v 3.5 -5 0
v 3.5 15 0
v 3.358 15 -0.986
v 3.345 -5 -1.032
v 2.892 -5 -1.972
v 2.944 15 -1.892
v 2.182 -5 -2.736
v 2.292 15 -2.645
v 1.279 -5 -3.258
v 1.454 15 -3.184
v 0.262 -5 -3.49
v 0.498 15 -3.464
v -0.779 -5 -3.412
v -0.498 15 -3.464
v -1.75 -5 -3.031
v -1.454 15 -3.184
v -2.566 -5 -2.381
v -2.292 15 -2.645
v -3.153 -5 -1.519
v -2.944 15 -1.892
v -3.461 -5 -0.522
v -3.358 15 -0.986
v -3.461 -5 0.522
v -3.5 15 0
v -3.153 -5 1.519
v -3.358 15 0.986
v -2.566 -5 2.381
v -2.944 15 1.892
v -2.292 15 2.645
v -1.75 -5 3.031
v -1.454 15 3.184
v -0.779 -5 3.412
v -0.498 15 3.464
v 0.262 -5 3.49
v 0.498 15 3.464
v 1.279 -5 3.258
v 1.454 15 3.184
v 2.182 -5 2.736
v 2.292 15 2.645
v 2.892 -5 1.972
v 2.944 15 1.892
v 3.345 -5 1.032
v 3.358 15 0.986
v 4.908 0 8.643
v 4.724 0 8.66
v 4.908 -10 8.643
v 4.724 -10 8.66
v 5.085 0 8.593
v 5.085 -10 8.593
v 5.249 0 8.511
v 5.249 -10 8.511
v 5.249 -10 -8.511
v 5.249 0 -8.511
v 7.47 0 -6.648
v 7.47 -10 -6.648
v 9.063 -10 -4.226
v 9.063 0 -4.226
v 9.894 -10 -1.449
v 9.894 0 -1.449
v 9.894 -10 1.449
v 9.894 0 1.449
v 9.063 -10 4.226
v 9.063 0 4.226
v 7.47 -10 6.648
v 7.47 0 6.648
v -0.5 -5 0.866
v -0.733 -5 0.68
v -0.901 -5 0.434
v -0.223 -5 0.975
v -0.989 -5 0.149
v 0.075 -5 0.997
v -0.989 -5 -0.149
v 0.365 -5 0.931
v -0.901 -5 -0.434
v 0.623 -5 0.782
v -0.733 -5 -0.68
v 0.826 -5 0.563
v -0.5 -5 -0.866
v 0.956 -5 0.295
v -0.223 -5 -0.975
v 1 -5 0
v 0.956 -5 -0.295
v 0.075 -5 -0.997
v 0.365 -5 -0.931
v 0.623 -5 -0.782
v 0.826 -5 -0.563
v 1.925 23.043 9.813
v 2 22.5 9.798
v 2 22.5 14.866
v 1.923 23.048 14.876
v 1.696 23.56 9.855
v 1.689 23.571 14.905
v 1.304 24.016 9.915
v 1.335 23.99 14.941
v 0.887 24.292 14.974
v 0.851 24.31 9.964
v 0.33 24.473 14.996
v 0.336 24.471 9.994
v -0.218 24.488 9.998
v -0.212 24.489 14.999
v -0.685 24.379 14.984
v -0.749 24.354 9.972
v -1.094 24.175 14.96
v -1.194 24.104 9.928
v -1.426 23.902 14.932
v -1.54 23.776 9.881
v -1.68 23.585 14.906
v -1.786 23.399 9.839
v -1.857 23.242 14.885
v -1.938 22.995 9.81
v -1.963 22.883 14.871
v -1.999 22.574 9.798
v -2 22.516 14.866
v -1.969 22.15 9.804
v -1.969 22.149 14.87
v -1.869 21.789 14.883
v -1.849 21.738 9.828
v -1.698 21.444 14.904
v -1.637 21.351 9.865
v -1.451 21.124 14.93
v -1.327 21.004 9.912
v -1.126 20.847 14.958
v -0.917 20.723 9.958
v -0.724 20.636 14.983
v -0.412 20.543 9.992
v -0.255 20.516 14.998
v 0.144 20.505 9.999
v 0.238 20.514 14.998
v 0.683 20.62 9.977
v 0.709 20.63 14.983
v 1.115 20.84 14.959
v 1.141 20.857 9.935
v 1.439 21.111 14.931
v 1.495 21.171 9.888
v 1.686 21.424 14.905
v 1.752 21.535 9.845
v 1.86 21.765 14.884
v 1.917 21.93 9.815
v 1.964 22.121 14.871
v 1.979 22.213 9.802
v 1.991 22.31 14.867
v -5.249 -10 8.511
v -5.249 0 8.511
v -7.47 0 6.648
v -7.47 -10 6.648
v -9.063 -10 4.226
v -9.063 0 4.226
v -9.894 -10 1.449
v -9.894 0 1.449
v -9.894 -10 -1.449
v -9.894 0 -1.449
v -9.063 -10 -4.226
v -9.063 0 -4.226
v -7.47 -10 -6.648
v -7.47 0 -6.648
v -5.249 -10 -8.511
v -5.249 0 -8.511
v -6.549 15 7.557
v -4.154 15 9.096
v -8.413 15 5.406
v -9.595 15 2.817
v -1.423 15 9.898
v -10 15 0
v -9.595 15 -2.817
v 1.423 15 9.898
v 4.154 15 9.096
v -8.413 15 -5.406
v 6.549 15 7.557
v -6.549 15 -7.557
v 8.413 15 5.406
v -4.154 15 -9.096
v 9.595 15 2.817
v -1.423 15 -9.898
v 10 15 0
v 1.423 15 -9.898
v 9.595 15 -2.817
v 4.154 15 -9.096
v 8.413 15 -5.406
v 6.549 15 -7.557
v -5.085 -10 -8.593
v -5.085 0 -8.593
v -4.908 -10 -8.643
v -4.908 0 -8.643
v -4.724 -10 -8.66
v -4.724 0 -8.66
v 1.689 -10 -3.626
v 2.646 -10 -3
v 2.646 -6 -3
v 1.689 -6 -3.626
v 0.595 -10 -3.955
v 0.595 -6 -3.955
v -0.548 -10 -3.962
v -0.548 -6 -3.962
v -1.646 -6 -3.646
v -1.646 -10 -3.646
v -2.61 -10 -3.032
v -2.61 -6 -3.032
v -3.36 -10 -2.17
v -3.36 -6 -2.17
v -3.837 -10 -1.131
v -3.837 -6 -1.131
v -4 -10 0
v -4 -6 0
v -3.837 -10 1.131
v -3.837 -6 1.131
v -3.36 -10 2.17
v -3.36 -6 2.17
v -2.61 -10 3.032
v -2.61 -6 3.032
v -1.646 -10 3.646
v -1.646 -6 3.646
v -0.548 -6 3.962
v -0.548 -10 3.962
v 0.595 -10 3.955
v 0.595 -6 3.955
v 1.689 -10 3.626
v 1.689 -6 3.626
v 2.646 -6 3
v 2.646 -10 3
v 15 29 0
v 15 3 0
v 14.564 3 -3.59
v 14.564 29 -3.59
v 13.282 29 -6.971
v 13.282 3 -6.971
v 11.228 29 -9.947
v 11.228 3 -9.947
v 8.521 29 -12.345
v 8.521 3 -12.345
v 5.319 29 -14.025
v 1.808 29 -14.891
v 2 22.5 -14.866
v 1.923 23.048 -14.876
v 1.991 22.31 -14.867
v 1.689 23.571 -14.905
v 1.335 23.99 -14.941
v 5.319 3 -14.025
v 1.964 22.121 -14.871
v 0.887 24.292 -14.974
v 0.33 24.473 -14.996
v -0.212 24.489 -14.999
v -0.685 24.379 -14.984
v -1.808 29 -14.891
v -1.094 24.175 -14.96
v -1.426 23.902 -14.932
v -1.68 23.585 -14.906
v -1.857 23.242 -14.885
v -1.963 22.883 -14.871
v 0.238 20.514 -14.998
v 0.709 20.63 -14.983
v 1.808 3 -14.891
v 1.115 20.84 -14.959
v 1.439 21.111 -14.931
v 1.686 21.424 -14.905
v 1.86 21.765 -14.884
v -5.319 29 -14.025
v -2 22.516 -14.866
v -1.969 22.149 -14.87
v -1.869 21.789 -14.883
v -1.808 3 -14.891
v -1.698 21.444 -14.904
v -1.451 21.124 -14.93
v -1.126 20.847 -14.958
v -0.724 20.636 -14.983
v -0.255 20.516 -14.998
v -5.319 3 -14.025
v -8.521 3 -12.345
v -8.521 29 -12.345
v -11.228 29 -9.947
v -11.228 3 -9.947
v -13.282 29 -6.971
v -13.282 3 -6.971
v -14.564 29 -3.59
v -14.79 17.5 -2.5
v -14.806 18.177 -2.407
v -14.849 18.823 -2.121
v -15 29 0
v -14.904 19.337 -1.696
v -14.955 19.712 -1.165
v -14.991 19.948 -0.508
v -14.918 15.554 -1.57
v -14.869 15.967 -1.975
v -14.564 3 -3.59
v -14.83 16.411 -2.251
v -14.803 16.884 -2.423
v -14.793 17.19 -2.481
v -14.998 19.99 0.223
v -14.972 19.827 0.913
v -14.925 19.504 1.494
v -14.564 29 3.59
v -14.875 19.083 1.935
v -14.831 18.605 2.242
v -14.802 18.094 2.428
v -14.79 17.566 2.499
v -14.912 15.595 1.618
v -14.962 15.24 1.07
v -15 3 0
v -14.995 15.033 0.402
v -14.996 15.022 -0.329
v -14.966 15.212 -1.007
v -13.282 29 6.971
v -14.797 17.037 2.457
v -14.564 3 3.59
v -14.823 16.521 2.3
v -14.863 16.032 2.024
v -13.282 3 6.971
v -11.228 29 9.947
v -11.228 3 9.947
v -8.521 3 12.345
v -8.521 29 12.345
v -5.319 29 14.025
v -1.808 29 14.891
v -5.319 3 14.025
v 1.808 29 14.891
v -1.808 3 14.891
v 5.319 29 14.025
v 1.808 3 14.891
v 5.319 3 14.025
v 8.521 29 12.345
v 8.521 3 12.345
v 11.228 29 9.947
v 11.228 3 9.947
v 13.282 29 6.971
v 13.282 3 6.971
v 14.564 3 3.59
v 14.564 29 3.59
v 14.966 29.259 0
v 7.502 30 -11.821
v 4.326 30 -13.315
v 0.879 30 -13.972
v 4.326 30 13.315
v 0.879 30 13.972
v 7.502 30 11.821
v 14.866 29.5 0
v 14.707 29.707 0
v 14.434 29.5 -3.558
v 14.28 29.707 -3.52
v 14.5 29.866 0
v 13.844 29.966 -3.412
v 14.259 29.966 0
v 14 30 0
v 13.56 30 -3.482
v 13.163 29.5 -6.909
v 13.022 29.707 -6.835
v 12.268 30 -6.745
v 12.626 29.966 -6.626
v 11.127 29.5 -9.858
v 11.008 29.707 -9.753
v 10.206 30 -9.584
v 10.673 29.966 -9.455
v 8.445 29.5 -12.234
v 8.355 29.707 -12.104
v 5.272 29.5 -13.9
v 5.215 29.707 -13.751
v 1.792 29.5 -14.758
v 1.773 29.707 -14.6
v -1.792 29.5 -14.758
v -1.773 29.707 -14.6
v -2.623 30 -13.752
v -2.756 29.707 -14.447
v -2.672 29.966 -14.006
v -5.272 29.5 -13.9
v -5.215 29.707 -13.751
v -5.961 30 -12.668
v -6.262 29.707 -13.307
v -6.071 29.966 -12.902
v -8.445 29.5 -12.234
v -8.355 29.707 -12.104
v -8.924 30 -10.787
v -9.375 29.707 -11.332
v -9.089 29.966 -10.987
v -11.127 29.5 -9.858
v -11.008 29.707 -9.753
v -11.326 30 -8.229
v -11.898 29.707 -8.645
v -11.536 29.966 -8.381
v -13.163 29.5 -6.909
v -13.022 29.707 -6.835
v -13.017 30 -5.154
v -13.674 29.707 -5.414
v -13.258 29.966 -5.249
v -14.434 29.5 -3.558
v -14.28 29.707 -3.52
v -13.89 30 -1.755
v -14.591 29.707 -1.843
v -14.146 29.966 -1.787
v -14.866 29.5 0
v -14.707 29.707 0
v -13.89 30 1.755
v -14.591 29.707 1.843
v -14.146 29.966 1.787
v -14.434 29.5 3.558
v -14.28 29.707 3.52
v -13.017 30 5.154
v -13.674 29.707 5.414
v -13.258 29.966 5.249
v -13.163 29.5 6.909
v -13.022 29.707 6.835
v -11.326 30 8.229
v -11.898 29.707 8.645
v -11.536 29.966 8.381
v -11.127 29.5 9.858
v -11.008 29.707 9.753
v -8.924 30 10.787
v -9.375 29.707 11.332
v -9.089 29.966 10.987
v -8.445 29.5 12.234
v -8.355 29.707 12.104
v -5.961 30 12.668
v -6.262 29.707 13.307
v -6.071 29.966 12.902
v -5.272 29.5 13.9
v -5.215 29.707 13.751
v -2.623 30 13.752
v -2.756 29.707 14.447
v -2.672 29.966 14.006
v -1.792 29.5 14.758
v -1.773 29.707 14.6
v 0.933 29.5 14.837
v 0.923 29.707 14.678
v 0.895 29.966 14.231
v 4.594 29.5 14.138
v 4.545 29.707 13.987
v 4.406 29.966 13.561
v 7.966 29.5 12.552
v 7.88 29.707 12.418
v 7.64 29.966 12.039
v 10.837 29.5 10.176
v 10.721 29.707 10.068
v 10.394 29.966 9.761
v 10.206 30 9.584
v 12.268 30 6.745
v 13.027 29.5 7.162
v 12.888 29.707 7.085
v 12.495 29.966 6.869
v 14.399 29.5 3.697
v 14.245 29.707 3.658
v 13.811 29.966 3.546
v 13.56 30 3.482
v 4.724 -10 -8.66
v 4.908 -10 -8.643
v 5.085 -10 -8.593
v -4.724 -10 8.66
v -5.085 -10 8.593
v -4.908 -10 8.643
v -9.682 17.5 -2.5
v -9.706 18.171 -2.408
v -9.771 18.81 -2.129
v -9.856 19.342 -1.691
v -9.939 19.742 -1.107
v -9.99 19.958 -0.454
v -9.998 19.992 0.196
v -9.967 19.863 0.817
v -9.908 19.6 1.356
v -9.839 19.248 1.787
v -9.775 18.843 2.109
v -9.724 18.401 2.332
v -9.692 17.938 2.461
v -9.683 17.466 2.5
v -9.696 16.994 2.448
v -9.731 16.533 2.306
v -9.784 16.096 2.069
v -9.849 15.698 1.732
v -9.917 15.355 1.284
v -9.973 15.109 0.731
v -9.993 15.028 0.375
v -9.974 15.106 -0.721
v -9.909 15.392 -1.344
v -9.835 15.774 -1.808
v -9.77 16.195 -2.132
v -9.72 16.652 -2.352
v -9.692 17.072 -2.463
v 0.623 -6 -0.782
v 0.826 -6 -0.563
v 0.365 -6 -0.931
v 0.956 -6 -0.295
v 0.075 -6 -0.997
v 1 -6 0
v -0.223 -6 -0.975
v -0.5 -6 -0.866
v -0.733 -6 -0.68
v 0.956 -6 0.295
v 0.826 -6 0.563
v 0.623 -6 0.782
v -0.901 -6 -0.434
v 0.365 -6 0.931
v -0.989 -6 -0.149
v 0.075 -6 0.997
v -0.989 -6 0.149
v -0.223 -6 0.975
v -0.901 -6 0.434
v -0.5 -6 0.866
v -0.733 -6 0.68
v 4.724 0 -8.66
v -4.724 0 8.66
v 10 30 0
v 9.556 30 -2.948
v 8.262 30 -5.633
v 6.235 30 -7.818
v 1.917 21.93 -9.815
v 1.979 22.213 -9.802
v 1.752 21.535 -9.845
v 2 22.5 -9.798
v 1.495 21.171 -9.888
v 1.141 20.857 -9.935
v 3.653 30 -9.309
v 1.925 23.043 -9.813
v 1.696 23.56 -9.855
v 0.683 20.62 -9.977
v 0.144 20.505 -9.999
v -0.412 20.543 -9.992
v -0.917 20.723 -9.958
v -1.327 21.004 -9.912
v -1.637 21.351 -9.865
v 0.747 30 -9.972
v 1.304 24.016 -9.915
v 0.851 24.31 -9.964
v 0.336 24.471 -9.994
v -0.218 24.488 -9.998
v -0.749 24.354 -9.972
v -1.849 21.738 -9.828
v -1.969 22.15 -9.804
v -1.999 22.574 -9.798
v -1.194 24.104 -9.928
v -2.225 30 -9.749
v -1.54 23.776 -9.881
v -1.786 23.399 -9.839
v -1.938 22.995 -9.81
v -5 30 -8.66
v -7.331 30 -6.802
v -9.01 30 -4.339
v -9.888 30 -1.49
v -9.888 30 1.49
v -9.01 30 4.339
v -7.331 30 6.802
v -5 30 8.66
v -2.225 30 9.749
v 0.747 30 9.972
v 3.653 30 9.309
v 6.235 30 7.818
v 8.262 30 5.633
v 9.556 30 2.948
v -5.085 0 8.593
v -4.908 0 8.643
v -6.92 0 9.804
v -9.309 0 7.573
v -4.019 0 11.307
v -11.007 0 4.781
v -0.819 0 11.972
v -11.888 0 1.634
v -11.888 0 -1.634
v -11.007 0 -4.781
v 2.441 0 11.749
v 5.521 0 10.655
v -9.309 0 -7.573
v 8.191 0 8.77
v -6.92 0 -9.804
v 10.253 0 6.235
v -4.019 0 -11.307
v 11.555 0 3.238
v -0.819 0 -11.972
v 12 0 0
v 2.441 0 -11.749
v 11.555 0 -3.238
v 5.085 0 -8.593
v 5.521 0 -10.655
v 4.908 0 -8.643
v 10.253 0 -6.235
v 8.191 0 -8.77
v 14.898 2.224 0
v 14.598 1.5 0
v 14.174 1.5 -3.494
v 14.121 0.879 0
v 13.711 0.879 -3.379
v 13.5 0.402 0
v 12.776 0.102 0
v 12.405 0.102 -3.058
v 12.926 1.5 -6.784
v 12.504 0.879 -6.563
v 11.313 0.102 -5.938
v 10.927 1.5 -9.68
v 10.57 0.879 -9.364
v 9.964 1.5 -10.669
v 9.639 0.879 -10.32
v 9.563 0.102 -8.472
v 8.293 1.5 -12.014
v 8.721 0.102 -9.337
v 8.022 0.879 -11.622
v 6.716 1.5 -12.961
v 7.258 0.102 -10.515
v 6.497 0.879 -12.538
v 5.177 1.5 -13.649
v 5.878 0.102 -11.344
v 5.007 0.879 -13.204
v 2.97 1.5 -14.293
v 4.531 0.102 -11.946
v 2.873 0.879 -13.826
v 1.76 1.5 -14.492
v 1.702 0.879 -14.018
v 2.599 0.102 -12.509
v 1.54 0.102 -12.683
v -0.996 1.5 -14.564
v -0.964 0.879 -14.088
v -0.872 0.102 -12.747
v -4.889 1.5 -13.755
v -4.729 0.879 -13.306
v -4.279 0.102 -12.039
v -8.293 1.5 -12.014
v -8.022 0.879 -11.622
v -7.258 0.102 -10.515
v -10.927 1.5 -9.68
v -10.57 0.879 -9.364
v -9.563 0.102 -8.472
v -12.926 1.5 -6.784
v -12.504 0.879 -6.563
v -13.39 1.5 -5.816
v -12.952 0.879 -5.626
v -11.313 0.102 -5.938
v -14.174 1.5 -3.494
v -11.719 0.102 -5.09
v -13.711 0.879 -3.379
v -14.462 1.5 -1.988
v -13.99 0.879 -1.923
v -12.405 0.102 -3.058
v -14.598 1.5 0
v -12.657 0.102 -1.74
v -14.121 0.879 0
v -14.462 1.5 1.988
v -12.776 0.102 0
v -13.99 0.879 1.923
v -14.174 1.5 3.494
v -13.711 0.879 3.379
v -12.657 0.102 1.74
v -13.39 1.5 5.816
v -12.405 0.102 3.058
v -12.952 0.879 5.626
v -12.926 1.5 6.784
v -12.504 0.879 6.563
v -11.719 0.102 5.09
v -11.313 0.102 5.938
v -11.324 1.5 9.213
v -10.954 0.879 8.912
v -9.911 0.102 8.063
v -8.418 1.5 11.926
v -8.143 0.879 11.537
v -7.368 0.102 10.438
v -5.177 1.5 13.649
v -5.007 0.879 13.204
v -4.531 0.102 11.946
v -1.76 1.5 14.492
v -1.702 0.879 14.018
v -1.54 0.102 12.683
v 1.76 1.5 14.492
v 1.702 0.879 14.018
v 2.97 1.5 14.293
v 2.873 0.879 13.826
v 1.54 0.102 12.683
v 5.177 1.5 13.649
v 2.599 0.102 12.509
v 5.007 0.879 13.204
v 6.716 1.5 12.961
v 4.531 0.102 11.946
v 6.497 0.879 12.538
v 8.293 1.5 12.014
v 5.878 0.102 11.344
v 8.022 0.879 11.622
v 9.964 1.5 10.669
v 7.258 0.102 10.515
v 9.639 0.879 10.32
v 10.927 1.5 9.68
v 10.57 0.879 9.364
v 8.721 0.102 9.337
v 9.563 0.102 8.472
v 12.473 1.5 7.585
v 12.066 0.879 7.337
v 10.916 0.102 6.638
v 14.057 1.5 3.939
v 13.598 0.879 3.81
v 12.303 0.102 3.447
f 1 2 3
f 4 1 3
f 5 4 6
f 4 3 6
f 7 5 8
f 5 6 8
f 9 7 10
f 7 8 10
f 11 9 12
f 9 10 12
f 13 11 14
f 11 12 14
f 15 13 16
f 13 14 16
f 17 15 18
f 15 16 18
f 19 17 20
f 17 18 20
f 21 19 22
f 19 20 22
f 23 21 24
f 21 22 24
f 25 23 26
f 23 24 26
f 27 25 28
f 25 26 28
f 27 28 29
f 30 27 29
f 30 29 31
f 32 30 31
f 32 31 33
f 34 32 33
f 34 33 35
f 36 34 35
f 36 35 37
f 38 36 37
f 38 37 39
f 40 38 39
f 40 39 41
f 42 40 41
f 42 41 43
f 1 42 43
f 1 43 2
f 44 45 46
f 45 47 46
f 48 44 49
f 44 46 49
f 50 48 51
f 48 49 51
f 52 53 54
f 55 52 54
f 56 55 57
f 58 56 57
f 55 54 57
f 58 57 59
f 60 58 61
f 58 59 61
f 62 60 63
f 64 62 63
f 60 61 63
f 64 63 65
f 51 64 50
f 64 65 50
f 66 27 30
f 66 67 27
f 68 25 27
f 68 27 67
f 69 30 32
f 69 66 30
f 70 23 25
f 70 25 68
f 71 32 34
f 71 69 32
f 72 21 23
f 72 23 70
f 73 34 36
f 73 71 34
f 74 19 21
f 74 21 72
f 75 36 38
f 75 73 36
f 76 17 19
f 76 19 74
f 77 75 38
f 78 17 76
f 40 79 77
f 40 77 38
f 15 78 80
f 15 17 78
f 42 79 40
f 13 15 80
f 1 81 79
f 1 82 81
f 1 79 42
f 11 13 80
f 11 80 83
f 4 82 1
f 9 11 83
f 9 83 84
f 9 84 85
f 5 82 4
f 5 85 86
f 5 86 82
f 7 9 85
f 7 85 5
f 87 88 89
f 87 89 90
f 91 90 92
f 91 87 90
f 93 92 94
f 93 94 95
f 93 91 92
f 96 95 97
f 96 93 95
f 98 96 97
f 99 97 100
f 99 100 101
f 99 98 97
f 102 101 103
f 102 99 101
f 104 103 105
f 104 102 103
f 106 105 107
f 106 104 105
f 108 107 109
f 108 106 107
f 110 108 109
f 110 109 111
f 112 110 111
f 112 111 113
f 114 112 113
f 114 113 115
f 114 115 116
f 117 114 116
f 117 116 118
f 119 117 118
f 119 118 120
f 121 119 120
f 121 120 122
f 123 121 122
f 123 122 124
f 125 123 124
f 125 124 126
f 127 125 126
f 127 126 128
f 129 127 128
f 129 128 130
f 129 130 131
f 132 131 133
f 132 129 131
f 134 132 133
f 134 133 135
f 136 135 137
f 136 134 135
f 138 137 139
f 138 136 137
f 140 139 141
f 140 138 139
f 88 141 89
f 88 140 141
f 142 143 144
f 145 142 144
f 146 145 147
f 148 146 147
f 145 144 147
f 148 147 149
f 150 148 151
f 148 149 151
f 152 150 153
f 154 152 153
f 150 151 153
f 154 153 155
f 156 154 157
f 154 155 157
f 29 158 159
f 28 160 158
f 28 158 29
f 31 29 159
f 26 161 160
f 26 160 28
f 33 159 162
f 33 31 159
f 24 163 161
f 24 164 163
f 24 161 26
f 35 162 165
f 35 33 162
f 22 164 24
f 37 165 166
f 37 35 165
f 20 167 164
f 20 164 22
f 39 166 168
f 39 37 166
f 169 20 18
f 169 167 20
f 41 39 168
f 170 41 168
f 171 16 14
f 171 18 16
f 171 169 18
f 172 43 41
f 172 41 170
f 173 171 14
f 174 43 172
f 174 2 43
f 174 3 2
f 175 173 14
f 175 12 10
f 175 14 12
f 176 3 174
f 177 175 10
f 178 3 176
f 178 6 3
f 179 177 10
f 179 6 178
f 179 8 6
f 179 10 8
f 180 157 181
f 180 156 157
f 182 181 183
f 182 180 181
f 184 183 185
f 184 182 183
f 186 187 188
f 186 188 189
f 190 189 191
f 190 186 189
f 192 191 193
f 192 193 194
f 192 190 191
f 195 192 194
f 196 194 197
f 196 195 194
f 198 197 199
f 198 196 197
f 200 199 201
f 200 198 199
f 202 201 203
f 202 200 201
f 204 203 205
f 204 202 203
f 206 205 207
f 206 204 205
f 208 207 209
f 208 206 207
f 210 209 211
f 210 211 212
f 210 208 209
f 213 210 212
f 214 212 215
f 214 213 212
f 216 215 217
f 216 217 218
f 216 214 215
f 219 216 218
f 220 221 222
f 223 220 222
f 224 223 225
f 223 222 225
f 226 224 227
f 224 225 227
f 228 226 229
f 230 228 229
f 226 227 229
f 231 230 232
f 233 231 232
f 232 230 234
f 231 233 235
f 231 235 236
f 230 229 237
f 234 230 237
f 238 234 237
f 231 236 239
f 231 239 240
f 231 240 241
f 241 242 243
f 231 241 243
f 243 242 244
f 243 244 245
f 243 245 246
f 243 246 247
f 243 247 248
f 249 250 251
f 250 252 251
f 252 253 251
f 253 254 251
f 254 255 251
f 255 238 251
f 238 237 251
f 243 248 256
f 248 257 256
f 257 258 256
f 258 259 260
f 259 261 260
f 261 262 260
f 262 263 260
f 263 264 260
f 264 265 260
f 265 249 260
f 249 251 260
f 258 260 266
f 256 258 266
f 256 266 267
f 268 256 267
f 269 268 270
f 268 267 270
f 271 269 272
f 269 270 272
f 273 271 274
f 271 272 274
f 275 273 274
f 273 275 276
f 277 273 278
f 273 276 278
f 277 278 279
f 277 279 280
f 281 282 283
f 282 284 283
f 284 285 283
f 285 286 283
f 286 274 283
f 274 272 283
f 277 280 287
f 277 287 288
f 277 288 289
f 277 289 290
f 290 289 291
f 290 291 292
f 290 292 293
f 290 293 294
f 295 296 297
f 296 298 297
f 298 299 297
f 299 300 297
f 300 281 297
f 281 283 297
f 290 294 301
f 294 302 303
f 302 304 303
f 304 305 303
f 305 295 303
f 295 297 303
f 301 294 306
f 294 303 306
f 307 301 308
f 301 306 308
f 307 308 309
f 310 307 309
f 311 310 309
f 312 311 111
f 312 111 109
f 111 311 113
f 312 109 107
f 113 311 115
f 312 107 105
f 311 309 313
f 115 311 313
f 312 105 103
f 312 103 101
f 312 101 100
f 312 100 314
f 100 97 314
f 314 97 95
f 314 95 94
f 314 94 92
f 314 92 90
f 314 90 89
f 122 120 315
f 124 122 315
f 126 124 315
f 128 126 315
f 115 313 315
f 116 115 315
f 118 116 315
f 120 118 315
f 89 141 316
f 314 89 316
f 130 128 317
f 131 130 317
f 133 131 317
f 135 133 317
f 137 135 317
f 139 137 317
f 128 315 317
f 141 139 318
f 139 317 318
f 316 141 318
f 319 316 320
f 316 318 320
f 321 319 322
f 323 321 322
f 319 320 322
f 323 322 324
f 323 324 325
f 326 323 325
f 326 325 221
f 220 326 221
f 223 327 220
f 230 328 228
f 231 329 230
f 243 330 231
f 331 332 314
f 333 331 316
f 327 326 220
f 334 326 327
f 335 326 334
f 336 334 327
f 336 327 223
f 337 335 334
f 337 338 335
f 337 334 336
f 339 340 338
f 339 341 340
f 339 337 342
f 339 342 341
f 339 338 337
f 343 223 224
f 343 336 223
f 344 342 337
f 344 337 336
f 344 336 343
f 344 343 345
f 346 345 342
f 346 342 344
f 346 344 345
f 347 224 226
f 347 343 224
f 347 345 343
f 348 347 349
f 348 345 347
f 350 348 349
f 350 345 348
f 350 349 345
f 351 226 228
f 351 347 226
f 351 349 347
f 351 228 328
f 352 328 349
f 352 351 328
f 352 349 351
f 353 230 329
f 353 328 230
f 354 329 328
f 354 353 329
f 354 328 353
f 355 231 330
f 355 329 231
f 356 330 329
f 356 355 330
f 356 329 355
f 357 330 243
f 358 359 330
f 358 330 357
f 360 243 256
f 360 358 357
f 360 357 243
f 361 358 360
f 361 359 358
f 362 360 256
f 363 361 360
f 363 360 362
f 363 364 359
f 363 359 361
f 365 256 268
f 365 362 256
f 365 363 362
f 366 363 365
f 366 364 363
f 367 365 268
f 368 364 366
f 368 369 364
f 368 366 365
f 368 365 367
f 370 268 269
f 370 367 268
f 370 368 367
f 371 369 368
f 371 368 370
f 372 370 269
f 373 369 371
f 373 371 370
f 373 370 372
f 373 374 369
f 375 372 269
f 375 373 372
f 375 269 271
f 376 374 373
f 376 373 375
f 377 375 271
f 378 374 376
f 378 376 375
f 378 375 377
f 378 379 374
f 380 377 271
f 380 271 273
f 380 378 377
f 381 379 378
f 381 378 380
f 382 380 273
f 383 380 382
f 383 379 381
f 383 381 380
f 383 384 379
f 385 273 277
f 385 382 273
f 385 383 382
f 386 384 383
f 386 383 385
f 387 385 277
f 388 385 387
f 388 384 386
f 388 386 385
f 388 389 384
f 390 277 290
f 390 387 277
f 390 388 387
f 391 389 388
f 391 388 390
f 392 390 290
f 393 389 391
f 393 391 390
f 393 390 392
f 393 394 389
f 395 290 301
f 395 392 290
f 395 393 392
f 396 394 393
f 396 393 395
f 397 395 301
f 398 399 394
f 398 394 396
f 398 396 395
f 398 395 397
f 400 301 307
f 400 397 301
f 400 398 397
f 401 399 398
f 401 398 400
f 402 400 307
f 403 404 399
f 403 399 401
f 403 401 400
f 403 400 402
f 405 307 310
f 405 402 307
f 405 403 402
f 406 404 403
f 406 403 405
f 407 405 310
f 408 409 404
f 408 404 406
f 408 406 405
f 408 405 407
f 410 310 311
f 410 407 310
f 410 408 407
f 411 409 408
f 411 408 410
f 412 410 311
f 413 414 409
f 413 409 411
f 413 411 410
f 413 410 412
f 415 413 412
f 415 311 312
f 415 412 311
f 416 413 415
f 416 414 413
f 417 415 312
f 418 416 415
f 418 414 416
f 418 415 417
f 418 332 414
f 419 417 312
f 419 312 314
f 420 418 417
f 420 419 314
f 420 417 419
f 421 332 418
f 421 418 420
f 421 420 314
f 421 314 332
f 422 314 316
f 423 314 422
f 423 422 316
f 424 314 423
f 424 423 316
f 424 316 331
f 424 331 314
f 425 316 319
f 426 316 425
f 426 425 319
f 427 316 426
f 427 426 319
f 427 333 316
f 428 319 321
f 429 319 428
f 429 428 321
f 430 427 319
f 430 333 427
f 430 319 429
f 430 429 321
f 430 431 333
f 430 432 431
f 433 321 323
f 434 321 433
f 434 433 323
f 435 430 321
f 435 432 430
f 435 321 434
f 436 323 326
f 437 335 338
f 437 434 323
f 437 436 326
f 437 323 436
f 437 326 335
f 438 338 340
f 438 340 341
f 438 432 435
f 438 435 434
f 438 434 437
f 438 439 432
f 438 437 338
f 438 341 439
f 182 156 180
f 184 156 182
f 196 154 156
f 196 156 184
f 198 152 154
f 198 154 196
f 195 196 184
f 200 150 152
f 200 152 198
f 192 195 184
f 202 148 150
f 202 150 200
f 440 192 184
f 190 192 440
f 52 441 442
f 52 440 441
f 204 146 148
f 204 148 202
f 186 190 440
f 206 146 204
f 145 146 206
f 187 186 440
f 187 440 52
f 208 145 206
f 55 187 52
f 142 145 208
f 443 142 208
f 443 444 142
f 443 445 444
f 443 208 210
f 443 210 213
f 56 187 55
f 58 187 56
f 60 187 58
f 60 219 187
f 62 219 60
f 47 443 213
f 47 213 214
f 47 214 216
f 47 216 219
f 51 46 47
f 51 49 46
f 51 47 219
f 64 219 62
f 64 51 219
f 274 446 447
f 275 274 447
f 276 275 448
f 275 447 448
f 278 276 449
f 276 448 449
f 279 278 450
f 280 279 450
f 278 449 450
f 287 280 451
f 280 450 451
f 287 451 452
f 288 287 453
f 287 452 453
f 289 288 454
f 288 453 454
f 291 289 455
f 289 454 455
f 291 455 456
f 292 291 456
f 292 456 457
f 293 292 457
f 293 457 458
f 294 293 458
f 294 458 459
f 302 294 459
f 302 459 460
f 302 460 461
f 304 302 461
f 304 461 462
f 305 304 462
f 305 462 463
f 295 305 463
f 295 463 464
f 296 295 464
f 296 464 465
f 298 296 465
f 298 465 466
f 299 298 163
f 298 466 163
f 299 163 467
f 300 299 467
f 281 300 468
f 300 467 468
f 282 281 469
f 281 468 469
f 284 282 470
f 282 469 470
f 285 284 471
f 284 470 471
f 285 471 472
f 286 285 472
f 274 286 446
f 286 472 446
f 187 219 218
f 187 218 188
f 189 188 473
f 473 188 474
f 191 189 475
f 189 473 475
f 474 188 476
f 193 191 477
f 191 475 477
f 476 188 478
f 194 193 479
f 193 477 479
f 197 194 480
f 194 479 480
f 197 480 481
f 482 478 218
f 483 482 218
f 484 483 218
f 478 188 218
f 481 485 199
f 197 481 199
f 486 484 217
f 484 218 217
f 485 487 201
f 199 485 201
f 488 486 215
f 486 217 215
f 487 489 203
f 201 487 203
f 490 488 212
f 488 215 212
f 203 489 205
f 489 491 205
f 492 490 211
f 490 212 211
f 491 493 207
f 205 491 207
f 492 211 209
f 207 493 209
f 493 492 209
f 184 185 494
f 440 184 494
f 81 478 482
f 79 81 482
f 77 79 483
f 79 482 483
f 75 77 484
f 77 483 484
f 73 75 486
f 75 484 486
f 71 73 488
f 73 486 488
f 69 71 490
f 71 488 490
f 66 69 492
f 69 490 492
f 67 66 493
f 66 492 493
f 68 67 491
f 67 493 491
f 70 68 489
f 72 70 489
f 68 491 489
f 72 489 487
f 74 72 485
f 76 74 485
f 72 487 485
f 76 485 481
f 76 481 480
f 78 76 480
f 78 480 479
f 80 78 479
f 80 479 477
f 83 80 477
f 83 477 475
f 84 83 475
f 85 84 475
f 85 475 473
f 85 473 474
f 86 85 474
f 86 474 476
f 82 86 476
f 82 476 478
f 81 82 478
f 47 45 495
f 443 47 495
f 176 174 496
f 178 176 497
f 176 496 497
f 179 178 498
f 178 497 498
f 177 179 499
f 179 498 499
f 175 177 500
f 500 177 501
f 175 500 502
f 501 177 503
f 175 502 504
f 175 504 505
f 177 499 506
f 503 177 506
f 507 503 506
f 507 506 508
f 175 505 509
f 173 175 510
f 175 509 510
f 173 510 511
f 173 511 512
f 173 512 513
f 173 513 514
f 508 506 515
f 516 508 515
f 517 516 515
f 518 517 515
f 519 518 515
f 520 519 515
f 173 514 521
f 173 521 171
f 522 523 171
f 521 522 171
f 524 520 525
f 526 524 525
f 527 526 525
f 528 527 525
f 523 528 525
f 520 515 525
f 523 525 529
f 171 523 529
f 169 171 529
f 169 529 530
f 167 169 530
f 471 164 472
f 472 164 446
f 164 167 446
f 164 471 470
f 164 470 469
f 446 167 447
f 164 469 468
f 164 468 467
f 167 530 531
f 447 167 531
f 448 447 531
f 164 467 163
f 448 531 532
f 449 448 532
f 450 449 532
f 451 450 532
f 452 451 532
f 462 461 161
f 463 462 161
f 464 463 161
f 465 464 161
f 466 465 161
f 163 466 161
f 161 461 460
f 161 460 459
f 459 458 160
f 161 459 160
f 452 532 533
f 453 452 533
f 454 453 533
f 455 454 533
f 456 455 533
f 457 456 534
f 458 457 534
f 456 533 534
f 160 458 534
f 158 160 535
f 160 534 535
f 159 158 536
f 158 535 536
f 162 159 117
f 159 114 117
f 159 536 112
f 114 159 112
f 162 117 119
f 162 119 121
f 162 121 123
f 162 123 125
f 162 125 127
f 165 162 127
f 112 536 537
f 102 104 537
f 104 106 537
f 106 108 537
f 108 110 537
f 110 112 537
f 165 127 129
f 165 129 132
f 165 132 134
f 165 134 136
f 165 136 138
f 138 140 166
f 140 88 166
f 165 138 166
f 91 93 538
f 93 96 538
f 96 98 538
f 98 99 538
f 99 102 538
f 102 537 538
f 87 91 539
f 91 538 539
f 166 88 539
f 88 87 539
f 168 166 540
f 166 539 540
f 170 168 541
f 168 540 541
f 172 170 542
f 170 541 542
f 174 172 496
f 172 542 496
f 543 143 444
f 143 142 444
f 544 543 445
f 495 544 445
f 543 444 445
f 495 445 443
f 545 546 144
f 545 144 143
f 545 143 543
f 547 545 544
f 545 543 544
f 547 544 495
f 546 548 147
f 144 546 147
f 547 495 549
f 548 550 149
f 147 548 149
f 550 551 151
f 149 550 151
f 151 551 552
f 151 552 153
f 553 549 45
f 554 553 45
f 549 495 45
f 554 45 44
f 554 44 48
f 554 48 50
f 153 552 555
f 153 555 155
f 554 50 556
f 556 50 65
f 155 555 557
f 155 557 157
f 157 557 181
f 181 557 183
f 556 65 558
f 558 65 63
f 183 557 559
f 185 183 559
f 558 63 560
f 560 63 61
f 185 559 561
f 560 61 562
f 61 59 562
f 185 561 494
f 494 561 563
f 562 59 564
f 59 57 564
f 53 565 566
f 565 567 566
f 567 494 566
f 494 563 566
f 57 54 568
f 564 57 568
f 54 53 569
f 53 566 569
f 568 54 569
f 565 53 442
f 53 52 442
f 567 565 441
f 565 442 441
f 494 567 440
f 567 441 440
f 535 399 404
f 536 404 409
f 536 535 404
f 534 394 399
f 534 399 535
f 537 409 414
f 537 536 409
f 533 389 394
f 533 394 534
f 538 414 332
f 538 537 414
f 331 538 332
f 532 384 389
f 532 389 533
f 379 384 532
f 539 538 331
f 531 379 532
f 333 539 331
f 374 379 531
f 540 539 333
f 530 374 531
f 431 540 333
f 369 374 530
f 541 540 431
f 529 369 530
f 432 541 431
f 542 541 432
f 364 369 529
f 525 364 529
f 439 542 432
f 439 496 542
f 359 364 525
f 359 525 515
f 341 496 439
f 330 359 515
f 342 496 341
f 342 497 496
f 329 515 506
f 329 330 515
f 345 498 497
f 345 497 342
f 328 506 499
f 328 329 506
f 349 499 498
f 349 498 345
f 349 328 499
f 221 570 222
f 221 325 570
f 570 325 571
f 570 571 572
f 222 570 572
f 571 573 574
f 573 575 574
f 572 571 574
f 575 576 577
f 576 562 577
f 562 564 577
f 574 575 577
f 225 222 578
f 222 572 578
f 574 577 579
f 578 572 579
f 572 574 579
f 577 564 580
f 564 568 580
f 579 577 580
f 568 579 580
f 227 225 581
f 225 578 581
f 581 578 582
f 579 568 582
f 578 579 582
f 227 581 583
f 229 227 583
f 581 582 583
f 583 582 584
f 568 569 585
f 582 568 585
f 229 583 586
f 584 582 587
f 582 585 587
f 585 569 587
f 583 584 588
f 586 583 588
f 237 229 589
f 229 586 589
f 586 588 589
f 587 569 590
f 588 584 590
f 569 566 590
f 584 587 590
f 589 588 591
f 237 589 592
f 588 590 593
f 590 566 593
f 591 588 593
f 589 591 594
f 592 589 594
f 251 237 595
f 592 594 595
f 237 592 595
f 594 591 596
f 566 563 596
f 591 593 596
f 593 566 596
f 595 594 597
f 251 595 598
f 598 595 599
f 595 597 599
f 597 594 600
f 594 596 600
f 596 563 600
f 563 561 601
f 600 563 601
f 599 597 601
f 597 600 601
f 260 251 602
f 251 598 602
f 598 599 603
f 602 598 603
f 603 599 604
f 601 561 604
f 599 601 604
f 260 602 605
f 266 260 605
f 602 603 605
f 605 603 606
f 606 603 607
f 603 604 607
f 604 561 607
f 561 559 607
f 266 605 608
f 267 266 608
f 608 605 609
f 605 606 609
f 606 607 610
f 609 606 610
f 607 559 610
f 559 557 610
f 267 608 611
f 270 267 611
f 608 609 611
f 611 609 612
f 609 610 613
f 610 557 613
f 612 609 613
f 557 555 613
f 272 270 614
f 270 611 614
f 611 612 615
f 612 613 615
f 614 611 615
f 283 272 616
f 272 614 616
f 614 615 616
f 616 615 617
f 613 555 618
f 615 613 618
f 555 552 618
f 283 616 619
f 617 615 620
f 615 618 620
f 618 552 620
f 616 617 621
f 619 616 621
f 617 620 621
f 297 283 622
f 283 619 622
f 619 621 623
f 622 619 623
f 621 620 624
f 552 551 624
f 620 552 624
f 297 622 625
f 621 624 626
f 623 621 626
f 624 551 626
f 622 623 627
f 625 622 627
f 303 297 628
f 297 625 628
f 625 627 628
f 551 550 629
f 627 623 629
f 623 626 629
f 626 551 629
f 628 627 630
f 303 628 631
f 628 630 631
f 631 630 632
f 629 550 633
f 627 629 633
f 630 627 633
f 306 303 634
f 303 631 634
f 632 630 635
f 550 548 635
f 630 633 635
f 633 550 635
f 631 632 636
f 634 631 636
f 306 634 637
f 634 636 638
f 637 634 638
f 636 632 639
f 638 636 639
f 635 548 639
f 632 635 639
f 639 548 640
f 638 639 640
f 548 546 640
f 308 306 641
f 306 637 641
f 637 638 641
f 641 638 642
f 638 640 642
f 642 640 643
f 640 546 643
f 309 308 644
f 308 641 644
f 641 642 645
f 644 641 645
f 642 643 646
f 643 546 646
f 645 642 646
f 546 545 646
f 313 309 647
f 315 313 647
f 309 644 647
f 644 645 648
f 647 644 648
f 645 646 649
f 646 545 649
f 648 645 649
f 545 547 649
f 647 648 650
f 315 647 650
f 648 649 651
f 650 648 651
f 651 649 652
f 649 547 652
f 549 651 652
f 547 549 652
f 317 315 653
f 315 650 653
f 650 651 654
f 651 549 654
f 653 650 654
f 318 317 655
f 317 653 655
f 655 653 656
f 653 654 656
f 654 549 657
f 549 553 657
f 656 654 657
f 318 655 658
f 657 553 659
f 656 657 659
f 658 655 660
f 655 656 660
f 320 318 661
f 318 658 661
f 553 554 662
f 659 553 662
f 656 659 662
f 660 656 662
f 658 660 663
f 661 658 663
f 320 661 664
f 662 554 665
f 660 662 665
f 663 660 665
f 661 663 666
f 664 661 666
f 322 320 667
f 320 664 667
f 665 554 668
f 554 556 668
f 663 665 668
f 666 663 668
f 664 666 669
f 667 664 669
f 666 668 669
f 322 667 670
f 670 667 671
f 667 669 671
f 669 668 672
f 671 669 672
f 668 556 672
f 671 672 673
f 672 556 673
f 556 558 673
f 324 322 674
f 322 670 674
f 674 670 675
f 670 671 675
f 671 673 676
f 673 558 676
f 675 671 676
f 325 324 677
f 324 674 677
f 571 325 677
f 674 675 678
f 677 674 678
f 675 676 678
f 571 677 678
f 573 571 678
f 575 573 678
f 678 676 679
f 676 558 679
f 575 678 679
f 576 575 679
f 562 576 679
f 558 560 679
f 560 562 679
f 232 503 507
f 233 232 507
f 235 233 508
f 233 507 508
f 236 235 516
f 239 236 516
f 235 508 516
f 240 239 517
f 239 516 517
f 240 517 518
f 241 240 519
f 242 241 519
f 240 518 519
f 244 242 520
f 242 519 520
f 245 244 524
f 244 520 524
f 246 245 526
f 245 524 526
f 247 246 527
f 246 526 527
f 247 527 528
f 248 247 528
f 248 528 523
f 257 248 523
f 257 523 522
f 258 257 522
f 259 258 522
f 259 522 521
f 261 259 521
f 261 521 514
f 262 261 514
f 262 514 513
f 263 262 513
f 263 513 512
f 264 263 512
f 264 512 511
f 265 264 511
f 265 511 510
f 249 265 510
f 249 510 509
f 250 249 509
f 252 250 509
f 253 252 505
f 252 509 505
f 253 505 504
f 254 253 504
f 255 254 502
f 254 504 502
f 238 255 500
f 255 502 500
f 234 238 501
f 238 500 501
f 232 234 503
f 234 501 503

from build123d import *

# Parameters (mm, degrees)
ESBO_O1_R                  = 15
RESSALTO_EXTRUS_O1_DEPTH   = 30
ESBO_O2_R                  = 10
CORTE_EXTRUS_O1_DEPTH      = 15
RESSALTO_EXTRUS_O2_DEPTH   = 10
ESBO_O4_R                  = 1
CORTE_EXTRUS_O2_DEPTH      = 5
ESBO_O5_R                  = 3.5
CORTE_EXTRUS_O3_DEPTH      = 20
ESBO_O6_R                  = 2
CORTE_EXTRUS_O4_DEPTH      = 16
CORTE_EXTRUS_O4_DEPTH_BACK = 16
ESBO_O7_R                  = 2.5
CORTE_EXTRUS_O5_DEPTH      = 16.0000001
CORTE_EXTRUS_O6_DEPTH      = 4
FILETE1_R                  = 1
FILETE2_R                  = 3
FILETE4_R                  = 1


with BuildPart() as part:
    # Esboço1 → Ressalto-extrusão1 (new body)
    with BuildSketch(Plane(origin=(0, 0, 0), x_dir=(1, 0, 0), z_dir=(0, 1, 0))):
        Circle(ESBO_O1_R)
    extrude(amount=RESSALTO_EXTRUS_O1_DEPTH)

    # Esboço2 → Corte-extrusão1 (cut)
    with BuildSketch(Plane(origin=(0, 30, 0), x_dir=(1, 0, 0), z_dir=(0, 1, 0))):
        Circle(ESBO_O2_R)
    extrude(amount=-CORTE_EXTRUS_O1_DEPTH, mode=Mode.SUBTRACT)

    # Esboço3 → Ressalto-extrusão2 (add)
    with BuildSketch(Plane.XZ):
        with BuildLine():
            Line((-5, -8.660254038), (5, -8.660254038))
            ThreePointArc((5, -8.660254038), (10, 0), (5, 8.660254038))
            Line((5, 8.660254038), (-5, 8.660254038))
            ThreePointArc((-5, 8.660254038), (-10, 0), (-5, -8.660254038))
        make_face()
    extrude(amount=RESSALTO_EXTRUS_O2_DEPTH)

    # Esboço4 → Corte-extrusão2 (cut)
    with BuildSketch(Plane.XZ.offset(10)):
        Circle(ESBO_O4_R)
    extrude(amount=-CORTE_EXTRUS_O2_DEPTH, mode=Mode.SUBTRACT)

    # Esboço5 → Corte-extrusão3 (cut)
    with BuildSketch(Plane(origin=(0, 15, 0), x_dir=(1, 0, 0), z_dir=(0, 1, 0))):
        Circle(ESBO_O5_R)
    extrude(amount=-CORTE_EXTRUS_O3_DEPTH, mode=Mode.SUBTRACT)

    # Esboço6 → Corte-extrusão4 (cut, two sides)
    with BuildSketch(Plane.XY) as corte_extrus_o4_sk:
        with Locations((0, 22.5)):
            Circle(ESBO_O6_R)
    extrude(amount=CORTE_EXTRUS_O4_DEPTH, mode=Mode.SUBTRACT)
    extrude(corte_extrus_o4_sk.sketch, amount=-CORTE_EXTRUS_O4_DEPTH_BACK, mode=Mode.SUBTRACT)

    # Esboço7 → Corte-extrusão5 (cut, through all)
    with BuildSketch(Plane(origin=(0, 0, 0), x_dir=(0, 0, -1), z_dir=(1, 0, 0))):
        with Locations((0, 17.5)):
            Circle(ESBO_O7_R)
    extrude(amount=-CORTE_EXTRUS_O5_DEPTH, mode=Mode.SUBTRACT)

    # Esboço9 → Corte-extrusão6 (cut)
    with BuildSketch(Plane.XZ.offset(10)):
        with BuildLine():
            Line((2.645751311, 3), (2.645751311, -3))
            ThreePointArc((2.645751311, -3), (-4, 0), (2.645751311, 3))
        make_face()
    extrude(amount=-CORTE_EXTRUS_O6_DEPTH, mode=Mode.SUBTRACT)

    # Filete1
    filete1_edges = [part.edges().sort_by_distance(p)[0] for p in [
        (-15, 30, 0),
    ]]
    fillet(filete1_edges, radius=FILETE1_R)

    # Filete2
    filete2_edges = [part.edges().sort_by_distance(p)[0] for p in [
        (-15, 0, 0),
    ]]
    fillet(filete2_edges, radius=FILETE2_R)

    # Filete4
    filete4_edges = [part.edges().sort_by_distance(p)[0] for p in [
        (-5, -5, 8.660254038),
        (-5, -5, -8.660254038),
        (5, -5, -8.660254038),
        (5, -5, 8.660254038),
    ]]
    fillet(filete4_edges, radius=FILETE4_R)


solid = part.part
